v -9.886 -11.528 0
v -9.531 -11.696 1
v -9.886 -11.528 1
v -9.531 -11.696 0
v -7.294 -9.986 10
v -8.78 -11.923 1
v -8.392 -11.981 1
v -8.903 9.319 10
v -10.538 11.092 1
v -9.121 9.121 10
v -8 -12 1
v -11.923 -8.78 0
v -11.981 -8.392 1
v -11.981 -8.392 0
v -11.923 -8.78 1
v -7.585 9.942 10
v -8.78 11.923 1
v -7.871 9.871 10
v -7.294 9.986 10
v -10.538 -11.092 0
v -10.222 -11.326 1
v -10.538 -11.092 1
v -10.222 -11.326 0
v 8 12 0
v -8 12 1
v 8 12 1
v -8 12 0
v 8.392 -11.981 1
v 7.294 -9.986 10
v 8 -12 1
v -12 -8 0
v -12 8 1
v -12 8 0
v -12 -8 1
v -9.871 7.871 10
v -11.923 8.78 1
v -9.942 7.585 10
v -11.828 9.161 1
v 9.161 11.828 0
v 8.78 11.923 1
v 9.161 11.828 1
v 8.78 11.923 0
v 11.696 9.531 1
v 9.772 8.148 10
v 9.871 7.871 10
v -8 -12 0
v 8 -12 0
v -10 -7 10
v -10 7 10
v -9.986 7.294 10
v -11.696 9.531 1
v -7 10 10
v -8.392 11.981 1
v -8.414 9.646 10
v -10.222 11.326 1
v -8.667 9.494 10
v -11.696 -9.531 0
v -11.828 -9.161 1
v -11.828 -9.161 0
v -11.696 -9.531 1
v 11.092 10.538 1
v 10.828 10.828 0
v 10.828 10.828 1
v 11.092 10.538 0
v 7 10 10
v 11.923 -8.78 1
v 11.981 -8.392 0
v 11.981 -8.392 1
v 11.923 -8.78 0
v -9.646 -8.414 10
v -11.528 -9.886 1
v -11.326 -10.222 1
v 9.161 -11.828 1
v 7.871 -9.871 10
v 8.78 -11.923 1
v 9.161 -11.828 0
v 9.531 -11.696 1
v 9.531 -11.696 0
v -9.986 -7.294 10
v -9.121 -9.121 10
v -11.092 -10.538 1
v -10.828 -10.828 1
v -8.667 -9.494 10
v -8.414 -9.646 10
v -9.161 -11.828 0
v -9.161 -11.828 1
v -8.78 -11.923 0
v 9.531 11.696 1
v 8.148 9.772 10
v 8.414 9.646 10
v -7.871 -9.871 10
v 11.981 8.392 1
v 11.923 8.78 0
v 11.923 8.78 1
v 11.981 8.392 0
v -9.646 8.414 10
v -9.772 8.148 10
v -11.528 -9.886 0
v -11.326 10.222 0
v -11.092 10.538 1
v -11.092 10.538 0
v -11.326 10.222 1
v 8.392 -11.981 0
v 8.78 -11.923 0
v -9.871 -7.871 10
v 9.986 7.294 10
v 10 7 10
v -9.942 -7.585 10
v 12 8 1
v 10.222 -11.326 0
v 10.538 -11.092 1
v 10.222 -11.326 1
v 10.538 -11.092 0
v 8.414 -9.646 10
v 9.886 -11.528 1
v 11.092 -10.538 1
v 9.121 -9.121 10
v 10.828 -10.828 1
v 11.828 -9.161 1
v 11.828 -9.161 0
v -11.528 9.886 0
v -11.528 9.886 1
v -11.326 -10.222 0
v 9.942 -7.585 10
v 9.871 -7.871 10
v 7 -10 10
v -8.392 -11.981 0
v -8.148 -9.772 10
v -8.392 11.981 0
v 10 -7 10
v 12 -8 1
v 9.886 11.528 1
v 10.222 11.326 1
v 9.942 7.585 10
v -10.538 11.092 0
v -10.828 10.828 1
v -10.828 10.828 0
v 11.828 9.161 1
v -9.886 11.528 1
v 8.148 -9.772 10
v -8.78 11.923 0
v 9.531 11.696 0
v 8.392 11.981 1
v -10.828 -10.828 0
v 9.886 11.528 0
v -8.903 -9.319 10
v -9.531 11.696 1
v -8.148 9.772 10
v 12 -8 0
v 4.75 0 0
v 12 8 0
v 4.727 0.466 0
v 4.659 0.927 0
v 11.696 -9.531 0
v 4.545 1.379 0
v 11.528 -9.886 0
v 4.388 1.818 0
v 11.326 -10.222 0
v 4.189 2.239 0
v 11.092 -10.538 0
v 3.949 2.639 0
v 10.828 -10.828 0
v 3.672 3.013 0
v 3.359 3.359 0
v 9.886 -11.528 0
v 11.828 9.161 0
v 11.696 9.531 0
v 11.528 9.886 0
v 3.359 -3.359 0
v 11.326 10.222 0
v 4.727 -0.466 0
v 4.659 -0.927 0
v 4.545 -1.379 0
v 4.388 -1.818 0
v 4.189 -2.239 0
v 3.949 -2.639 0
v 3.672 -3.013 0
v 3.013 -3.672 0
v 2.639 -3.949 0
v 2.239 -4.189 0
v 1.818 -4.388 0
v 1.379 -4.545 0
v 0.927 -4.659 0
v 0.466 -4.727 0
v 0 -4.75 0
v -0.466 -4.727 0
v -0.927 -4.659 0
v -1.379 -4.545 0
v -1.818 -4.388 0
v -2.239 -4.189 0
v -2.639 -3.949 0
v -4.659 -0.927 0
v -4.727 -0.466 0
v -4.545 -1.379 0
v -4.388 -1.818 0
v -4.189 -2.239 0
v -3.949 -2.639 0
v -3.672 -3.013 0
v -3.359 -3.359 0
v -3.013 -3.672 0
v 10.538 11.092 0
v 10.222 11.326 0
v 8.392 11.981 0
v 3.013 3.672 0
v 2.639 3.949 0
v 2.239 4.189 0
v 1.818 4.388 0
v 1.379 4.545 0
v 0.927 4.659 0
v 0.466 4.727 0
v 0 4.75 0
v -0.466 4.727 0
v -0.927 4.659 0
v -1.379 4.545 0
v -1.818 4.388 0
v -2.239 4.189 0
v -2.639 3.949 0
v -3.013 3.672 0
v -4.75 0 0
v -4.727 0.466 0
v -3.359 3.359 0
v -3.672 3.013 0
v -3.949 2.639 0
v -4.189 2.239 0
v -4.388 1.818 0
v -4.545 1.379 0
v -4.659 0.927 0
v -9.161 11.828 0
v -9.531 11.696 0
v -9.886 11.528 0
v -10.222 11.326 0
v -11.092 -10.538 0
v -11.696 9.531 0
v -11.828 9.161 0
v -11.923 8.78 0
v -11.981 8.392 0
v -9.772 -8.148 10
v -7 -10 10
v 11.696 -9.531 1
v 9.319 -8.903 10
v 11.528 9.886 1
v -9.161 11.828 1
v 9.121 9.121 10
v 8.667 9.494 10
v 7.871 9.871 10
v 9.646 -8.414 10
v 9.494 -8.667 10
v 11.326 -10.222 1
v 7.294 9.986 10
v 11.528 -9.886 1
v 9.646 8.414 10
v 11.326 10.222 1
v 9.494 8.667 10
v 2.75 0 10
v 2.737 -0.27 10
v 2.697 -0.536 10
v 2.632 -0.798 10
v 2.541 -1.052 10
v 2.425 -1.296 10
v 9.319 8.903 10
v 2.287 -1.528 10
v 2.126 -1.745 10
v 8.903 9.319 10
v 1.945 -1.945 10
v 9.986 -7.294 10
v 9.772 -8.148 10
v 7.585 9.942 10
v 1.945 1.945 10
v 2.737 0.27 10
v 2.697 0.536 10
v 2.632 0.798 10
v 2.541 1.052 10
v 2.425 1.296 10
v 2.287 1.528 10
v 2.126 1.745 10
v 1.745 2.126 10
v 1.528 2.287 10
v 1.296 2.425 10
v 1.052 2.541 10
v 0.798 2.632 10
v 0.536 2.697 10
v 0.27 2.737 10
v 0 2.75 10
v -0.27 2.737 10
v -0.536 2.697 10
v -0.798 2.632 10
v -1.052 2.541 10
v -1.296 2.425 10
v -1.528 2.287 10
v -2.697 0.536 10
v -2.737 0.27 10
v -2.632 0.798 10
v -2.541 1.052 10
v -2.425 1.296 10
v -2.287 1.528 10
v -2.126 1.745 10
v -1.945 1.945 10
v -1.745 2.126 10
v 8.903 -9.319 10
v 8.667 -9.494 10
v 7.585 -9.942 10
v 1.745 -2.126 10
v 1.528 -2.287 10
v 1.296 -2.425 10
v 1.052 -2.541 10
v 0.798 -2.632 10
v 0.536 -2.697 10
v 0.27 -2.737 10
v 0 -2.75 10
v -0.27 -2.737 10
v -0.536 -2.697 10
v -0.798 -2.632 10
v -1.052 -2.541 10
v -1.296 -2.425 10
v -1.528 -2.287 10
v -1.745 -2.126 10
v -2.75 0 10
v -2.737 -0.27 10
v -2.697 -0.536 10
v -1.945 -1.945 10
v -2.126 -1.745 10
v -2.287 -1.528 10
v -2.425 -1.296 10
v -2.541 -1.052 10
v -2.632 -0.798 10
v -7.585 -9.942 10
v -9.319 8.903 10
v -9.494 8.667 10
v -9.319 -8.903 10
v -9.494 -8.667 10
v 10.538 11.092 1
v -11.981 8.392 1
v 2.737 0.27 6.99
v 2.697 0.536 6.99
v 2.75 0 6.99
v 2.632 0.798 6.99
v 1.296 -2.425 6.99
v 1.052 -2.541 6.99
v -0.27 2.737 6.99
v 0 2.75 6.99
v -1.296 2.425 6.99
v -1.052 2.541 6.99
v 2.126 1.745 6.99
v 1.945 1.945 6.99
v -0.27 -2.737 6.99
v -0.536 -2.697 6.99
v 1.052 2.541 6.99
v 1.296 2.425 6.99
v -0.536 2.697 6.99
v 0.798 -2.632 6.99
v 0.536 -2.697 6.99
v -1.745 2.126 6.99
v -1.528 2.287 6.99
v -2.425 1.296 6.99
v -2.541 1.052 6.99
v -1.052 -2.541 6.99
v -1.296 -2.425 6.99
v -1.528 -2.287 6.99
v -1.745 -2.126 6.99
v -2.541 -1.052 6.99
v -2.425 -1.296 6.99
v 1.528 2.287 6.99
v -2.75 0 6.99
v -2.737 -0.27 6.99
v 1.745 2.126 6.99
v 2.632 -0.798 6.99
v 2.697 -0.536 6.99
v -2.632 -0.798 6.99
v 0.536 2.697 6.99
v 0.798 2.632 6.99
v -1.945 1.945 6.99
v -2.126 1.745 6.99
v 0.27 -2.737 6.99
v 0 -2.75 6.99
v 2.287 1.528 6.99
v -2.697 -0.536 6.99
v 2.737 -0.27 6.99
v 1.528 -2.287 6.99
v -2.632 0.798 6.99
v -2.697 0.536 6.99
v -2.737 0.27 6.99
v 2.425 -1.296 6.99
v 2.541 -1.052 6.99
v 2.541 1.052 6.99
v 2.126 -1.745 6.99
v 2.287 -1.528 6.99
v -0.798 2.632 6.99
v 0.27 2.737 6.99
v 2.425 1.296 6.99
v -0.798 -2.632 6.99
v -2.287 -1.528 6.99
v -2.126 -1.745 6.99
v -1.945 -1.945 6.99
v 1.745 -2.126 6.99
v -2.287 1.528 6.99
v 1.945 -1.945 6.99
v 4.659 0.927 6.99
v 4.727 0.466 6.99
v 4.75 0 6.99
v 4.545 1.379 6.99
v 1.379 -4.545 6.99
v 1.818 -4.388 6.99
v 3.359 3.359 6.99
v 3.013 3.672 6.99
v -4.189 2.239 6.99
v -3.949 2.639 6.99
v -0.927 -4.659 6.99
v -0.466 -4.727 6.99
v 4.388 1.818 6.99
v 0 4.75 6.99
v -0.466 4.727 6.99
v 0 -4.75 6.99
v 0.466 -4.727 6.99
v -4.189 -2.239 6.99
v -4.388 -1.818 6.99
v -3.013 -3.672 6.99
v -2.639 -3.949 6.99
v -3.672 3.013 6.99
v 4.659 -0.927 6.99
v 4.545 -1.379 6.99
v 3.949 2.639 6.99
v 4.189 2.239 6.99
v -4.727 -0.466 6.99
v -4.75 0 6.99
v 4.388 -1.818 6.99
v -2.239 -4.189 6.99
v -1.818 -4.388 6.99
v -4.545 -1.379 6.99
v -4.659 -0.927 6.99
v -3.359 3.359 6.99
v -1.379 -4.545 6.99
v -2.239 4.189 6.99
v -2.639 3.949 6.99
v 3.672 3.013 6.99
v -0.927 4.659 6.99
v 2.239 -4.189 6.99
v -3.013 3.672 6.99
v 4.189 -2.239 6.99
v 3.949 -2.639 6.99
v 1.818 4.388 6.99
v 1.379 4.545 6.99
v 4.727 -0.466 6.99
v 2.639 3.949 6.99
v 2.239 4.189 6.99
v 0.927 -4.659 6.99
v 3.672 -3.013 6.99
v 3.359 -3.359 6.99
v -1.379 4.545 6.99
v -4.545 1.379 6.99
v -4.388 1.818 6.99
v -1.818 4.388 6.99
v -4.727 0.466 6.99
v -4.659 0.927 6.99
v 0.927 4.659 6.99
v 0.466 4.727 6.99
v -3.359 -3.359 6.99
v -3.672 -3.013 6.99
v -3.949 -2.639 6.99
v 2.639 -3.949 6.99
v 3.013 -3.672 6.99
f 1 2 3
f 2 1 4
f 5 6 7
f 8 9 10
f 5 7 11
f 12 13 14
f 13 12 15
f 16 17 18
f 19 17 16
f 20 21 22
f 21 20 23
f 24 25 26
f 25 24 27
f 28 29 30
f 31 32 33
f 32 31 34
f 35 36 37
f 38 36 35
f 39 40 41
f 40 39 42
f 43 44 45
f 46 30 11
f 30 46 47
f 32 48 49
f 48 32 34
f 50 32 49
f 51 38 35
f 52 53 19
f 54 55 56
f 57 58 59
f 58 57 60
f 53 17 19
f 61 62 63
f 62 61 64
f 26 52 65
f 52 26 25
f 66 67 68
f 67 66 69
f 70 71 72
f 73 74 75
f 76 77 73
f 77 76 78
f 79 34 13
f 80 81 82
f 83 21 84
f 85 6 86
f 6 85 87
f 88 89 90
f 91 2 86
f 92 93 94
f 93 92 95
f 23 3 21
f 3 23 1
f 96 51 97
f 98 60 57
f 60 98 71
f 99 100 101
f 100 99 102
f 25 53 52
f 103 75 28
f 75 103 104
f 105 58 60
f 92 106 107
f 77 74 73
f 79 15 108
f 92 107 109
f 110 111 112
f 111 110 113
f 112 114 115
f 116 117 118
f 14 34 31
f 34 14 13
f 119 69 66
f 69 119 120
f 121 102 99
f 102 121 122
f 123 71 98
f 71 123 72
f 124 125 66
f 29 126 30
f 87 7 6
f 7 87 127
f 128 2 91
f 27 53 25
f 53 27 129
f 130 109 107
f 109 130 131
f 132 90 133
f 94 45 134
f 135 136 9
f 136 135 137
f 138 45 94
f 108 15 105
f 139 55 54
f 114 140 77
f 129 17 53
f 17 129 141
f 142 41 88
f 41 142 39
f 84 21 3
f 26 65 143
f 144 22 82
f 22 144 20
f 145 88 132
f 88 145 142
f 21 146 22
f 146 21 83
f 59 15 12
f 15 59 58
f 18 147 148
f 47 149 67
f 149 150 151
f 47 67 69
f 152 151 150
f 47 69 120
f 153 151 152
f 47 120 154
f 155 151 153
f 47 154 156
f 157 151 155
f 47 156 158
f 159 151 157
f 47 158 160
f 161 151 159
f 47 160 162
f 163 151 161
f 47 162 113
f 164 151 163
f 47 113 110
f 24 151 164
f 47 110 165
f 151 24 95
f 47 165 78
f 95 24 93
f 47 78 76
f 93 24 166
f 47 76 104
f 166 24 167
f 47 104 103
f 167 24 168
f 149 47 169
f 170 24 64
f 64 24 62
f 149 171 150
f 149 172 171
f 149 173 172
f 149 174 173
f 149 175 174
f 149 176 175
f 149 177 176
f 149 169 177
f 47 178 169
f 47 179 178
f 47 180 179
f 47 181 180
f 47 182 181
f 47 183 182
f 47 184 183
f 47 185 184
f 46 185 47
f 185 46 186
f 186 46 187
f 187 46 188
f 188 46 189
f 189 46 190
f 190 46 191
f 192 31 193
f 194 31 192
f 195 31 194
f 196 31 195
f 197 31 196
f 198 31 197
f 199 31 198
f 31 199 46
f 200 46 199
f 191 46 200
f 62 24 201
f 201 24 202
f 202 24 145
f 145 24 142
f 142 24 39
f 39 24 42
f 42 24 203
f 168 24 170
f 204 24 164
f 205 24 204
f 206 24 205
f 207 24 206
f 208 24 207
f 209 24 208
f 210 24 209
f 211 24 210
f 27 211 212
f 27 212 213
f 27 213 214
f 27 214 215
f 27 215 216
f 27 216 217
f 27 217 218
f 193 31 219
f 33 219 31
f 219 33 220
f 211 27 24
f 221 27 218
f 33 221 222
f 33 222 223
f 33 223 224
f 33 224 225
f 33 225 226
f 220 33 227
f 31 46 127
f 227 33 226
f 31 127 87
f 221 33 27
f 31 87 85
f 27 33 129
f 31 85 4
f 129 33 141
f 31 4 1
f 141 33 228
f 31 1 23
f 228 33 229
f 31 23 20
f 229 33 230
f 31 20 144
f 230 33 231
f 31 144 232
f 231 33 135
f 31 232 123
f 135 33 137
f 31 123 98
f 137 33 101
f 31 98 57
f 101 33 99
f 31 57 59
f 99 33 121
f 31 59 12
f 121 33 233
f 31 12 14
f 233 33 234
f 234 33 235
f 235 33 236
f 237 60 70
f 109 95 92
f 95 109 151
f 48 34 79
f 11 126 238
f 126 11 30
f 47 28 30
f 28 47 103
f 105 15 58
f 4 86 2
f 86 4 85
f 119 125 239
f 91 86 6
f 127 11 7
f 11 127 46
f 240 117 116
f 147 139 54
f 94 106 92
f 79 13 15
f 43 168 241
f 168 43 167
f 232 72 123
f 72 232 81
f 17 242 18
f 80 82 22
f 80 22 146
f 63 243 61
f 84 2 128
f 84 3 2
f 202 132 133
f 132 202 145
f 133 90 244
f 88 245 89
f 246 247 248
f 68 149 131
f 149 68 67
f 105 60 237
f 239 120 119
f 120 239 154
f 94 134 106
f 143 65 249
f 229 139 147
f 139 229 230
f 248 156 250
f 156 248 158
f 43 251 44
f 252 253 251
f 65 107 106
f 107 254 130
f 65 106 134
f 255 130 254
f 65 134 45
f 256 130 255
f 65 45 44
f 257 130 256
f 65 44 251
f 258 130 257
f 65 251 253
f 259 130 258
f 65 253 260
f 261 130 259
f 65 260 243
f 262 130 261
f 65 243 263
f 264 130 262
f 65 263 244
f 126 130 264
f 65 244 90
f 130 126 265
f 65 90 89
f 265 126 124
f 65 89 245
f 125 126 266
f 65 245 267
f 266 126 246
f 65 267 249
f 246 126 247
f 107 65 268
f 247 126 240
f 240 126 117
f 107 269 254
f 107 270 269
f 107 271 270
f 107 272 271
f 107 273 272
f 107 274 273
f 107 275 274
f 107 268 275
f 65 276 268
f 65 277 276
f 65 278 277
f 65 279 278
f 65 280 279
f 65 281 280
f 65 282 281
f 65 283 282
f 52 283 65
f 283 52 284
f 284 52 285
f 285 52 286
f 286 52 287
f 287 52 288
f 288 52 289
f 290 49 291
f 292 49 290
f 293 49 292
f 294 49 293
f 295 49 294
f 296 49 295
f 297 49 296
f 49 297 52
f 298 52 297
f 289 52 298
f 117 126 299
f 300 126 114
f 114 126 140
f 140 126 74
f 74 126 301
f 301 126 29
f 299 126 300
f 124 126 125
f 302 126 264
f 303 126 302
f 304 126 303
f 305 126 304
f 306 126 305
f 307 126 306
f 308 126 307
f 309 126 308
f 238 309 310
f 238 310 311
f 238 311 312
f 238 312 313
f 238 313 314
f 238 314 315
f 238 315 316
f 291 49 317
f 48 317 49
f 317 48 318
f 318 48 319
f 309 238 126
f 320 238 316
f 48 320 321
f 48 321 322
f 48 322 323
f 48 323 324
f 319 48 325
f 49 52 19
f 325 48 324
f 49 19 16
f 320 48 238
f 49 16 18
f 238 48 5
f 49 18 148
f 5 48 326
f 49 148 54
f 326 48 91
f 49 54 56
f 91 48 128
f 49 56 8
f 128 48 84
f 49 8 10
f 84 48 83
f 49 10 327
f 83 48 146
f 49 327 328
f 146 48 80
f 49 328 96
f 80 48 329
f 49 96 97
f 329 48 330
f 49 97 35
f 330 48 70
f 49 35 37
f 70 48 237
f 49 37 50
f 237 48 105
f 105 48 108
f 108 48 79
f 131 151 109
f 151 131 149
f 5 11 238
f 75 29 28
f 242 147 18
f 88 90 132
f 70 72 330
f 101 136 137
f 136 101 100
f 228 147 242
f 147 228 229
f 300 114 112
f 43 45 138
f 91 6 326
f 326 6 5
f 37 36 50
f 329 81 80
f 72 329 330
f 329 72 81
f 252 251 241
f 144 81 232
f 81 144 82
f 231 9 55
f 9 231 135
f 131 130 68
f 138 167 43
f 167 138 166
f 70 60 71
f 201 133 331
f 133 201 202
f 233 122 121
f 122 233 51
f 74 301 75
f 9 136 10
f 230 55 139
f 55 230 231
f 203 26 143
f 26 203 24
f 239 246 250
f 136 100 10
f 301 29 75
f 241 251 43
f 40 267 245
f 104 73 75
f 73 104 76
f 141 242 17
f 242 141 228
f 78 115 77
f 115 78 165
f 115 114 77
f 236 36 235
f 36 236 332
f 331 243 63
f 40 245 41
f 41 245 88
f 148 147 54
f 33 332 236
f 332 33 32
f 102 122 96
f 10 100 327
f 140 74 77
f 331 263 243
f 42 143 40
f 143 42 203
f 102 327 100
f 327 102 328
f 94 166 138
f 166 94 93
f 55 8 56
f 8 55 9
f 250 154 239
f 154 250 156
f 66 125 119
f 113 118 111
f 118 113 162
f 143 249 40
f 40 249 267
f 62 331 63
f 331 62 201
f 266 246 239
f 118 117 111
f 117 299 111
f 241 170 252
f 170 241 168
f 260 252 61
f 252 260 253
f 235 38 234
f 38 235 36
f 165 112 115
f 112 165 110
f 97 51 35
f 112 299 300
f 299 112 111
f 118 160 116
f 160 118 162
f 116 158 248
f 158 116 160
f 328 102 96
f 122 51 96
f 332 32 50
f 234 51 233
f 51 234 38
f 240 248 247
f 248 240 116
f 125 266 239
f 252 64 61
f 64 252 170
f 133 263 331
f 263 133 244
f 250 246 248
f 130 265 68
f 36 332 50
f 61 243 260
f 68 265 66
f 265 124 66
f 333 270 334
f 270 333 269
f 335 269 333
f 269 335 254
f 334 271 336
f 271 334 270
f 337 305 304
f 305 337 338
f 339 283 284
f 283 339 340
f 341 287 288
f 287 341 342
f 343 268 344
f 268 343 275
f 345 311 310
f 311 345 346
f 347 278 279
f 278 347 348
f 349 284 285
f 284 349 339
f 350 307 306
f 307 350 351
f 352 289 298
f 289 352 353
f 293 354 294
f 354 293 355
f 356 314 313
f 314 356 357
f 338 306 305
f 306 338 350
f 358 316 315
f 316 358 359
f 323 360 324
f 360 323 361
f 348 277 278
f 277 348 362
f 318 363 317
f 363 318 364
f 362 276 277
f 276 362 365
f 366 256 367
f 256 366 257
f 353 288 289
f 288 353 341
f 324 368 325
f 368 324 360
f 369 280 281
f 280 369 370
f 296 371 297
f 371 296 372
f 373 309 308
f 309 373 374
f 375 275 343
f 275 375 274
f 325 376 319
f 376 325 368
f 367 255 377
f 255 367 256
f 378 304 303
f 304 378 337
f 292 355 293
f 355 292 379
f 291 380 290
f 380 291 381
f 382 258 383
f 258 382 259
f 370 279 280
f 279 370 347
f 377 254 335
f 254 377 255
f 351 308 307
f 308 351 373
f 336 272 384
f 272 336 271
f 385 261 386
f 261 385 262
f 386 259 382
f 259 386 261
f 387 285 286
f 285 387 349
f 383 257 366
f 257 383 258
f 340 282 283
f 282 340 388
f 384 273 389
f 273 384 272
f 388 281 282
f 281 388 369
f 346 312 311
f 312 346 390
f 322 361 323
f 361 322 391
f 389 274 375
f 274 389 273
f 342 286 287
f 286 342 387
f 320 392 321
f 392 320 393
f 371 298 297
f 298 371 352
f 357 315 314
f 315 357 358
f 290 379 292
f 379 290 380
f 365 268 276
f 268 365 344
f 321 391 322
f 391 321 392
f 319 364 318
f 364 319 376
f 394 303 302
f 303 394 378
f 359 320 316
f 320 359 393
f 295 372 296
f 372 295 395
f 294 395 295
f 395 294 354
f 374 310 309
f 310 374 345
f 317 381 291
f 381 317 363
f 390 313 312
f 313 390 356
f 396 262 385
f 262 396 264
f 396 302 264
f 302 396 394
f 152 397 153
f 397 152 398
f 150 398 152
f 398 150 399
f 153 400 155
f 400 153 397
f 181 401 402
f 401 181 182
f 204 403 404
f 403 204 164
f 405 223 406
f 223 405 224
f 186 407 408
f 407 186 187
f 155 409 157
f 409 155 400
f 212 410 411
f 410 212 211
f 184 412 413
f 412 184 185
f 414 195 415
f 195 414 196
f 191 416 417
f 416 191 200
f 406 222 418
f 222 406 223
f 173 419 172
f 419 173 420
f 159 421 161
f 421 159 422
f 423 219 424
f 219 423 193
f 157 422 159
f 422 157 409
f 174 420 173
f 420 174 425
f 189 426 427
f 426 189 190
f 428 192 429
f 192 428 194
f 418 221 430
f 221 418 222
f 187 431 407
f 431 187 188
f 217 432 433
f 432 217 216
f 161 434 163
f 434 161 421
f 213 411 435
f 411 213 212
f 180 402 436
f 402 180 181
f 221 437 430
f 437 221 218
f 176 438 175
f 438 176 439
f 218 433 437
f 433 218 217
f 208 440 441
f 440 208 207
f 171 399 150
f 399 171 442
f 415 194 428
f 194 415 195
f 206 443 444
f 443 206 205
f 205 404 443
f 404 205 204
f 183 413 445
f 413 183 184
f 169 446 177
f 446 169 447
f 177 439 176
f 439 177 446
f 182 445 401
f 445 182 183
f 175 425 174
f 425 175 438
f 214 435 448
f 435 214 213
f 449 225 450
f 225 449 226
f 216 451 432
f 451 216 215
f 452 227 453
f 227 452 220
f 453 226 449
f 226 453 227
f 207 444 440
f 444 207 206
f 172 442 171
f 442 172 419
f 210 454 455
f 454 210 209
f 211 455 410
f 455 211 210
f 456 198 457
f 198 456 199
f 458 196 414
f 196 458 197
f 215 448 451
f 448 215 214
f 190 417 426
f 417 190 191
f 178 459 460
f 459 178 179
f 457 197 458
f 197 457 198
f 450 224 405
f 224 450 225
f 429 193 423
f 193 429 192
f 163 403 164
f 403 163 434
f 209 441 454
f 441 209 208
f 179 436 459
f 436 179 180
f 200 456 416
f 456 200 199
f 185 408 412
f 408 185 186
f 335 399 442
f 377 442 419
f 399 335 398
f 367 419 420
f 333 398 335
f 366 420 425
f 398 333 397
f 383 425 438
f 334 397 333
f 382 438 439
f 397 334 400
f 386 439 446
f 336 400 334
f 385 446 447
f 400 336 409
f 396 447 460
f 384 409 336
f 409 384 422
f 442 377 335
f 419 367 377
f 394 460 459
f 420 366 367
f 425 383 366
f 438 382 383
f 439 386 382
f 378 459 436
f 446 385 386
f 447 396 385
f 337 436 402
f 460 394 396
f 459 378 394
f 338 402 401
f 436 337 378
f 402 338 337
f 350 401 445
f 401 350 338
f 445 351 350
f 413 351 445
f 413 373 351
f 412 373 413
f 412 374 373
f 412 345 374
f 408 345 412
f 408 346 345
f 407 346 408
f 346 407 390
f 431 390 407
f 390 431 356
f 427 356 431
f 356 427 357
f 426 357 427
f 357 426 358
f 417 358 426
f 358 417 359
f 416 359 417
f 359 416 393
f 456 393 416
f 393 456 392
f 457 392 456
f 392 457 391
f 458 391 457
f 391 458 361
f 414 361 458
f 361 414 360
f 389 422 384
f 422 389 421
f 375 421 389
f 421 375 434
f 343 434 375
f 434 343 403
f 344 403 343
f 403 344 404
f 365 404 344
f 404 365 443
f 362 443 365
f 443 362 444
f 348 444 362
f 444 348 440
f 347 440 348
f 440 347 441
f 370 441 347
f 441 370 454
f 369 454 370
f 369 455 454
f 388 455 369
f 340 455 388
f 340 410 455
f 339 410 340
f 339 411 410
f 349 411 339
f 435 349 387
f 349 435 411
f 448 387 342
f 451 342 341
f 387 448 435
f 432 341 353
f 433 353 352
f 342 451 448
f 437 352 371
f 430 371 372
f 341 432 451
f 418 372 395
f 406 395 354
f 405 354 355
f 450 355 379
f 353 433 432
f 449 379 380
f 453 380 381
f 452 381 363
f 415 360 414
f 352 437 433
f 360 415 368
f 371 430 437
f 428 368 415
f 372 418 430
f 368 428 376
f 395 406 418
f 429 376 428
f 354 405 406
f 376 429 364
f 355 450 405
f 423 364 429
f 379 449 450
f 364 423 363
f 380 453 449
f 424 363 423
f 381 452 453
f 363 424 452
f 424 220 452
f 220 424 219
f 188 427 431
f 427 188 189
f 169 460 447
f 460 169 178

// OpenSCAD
// file: ../generated/config.scad
// GENERATED by tools/build.py from config/rack.yaml — do not edit.

FRAME_PROFILE = 20;
FRAME_W = 700;
FRAME_D = 225;
FRAME_TILT = 20;
FRAME_ROW_Y0 = 25;
FRAME_BRACKET = 10;
FRAME_INNER_X0 = 30;
FRAME_BASE_H = 80;
FRAME_FOOT_H = 10;
FRAME_TOP_Z = 760;
ROW_IDS = ["A", "B", "C", "D"];
ROW_HEIGHTS = [165, 165, 165, 185];
ROW_LAYOUTS = [[1, 1, 1, 1], [1, 1, 1, 1], [1, 1, 1, 1], [2, 2]];
BAY_PITCH = 160;
BAY_GAP = 2;
CARRIER_W = 158;
CARRIER_D = 210;
CARRIER_BOTTOM = 2.5;
CARRIER_WALL = 2;
CARRIER_STANDOFF = 5;
CARRIER_DECK = 3;
CARRIER_FASCIA = 2.5;
CARRIER_WALL_H = 20.1;
CARRIER_PLENUM = 23.1;
PCB_TO_FLOOR = 14;
CAM_MOUNT = [100, 60, 30];
DRAWER_D = 196;
DRAWER_W = 142;
DRAWER_X0 = 8;
DRAWER_TRAVEL = 140;
DRAWER_GUIDE_W = 7.5;
DRAWER_CLEAR = 0.5;
DRAWER_BOTTOM = 2.5;
DRAWER_WALL = 2;
DRAWER_WALL_H = 16;
DRAWER_FRONT_H = 30;
DRAWER_FRONT_T = 4;
DRAWER_REAR_BAY = 30;
DRAWER_FLANGE = [3, 3];
DRAWER_MAGNET = [6, 3];
PLATE_T = 2.5;
CHAIN_INNER = [7, 7];
CHAIN_OUTER = [11, 10];
CHAIN_R = 18;
CHAIN_FIXED = [104, 90];
CHAIN_MOVING_X = 140;
CHAIN_FOOT_Y = 172;
CHAIN_BEND_Y = 182;
NODE_SIZE = [64, 80];
NODE_T = 1.6;
NODE_HOLES = [[3.5, 3.5], [60.5, 3.5], [3.5, 76.5], [60.5, 76.5]];
NODE_X0 = 4;
NODE_FRONT_Y = 3;
NODE_PCB_TOP = 9.1;
NODE_FRONT = [32, 12, 50];
NODE_VH_Y = 64;
NODE_RIGHT = [24, 40];
NODE_CAM = [64, 11];
HUB_SIZE = [120, 70];
HUB_HOLES = [[4, 4], [116, 4], [4, 66], [116, 66]];
// file: ../lib/common.scad
// Shared helpers for every printed part of hw-testing-rack.
include <../generated/config.scad>

$fn = $preview ? 32 : 64;
EPS = 0.01;

// Heat-set inserts (Ruthex-style).  Hole Ø is the recommended pre-hole.
INSERT_M3 = [4.0, 5.7];    // [hole Ø, depth]
INSERT_M2 = [3.2, 4.0];
INSERT_M25 = [3.6, 4.5];
M3_CLEAR = 3.4;
M5_CLEAR = 5.5;
M3_HEAD = [6.0, 3.0];      // DIN 912 / ISO 7380 head Ø × height (button head ~5.7)

module rbox(size, r = 2, center = false) {
    // Box with rounded vertical edges.
    translate(center ? [-size[0] / 2, -size[1] / 2, 0] : [0, 0, 0])
        hull() for (x = [r, size[0] - r], y = [r, size[1] - r])
            translate([x, y, 0]) cylinder(r = r, h = size[2]);
}

module rslot(len, w, h) {
    // Stadium-shaped slot along X, centred on the origin.
    hull() for (x = [-(len - w) / 2, (len - w) / 2]) translate([x, 0, 0]) cylinder(d = w, h = h);
}

module insert_hole(spec = INSERT_M3) {
    // Pocket for a heat-set insert, opening at z=0 and going -Z.
    translate([0, 0, -spec[1]]) cylinder(d = spec[0], h = spec[1] + EPS);
    translate([0, 0, -0.6]) cylinder(d1 = spec[0], d2 = spec[0] + 0.8, h = 0.6 + EPS);
}

module screw_through(d = M3_CLEAR, h = 20, head = M3_HEAD, counterbore = true) {
    // Clearance hole along +Z from z=0, with an optional counterbore at z=h.
    translate([0, 0, -EPS]) cylinder(d = d, h = h + 2 * EPS);
    if (counterbore) translate([0, 0, h - head[1]]) cylinder(d = head[0] + 0.4, h = head[1] + EPS);
}

module magnet_pocket(d = DRAWER_MAGNET[0], t = DRAWER_MAGNET[1]) {
    // Press-fit/glue pocket for a disc magnet, opening at z=0 going -Z.
    translate([0, 0, -t - 0.2]) cylinder(d = d + 0.25, h = t + 0.2 + EPS);
}

module label_text(txt, size = 6, depth = 0.6, font = "Liberation Sans:style=Bold") {
    linear_extrude(depth) text(txt, size = size, font = font, halign = "center", valign = "center");
}

// 2020 B-type profile, simplified (good enough for previews and clearance checks).
module extrusion2020(len) {
    s = FRAME_PROFILE;
    difference() {
        translate([-s / 2, -s / 2, 0]) cube([s, s, len]);
        for (a = [0, 90, 180, 270]) rotate([0, 0, a])
            translate([s / 2 - 1.8, -3, -EPS]) {
                cube([1.8 + EPS, 6, len + 2 * EPS]);
                translate([-4.2, -2.6, 0]) cube([4.3, 11.2, len + 2 * EPS]);
            }
        translate([0, 0, -EPS]) cylinder(d = 4.2, h = len + 2 * EPS);
    }
}
// file: ../lib/carrier.scad
// Geometry shared by the carrier, deck, drawer, plates, chain parts and the assembly.
// All positions are in CARRIER coordinates (origin = front-left-bottom of one
// bay's carrier, X right, Y towards the back, Z up) unless stated otherwise.
include <common.scad>

WALL = CARRIER_WALL;
BOSS_D = 7.5;

// ---------------------------------------------------------------- bay node PCB
// KiCad coordinates on the node (y = 0 at the REAR edge) → carrier XY.
function node_xy(k) = [NODE_X0 + k[0], NODE_FRONT_Y + (NODE_SIZE[1] - k[1])];
NODE_REAR_Y = NODE_FRONT_Y + NODE_SIZE[1];
VH_NOTCH_Y = node_xy([0, NODE_VH_Y])[1];

// ---------------------------------------------------------------- deck fixings
// Side screws go guide → deck → base wall boss (one screw holds all three).
GUIDE_SCREW_X = 2.8;
function side_screws() = [for (y = [30, 105, 185]) for (x = [GUIDE_SCREW_X, CARRIER_W - GUIDE_SCREW_X]) [x, y]];
// Free-standing pillars under the deck middle (clear of the node and the chain).
function deck_pillars() = [[40, 165], [82, 165], [125, 75]];

// ---------------------------------------------------------------- drawer & guides
DRAWER_Y0 = 0;                                     // closed drawer front face
DRAWER_INNER_W = DRAWER_W - 2 * DRAWER_WALL;
DRAWER_PORT_WALL_Y = DRAWER_D - DRAWER_REAR_BAY;   // inner wall carrying the USB-C ports (drawer coords)
GUIDE_Y0 = DRAWER_FRONT_T + 1;
GUIDE_LIP_Z = DRAWER_FLANGE[1] + 0.4;              // lip underside above the deck
GUIDE_LIP_T = 2.0;
GUIDE_WALL_T = DRAWER_X0 - DRAWER_FLANGE[0] - 0.5;  // solid wall of the C-channel (inner face 0.5 from the flange)
STOP_PIN_X = DRAWER_X0 - DRAWER_FLANGE[0] / 2 - 0.2; // M2.5 stop screw, in the flange path
FLANGE_Y = [DRAWER_D - 26, DRAWER_D - 6];          // rear flange segment (drawer coords)
STOP_Y = FLANGE_Y[0] - DRAWER_TRAVEL - 4.5;        // stop pin position (carrier coords)
DETENT_DRAWER = [22, DRAWER_D - 14];               // magnet in drawer bottom (drawer coords)
DETENT_DECK = [DRAWER_X0 + DETENT_DRAWER[0], DETENT_DRAWER[1]];

// panel-mount USB-C (DATA) and a slot for the optional AUX (JST-SH) pigtail, on the port wall
PORT_X = [DRAWER_W * 0.38, DRAWER_W * 0.62];       // [DATA, AUX]
PORT_Z = DRAWER_BOTTOM + 7;
PORT_EARS = 26;                                    // M3 ear pitch of common panel-mount USB-C extensions

// drawer width for a bay spanning `span` units (wide bays share the node of their left unit)
function drawer_w(span) = span * BAY_PITCH - BAY_GAP - 2 * DRAWER_GUIDE_W - 2 * DRAWER_CLEAR;

// board plate (drops into the drawer between front panel and port wall)
function plate_w(span) = drawer_w(span) - 2 * DRAWER_WALL - 0.6;
PLATE_W = DRAWER_INNER_W - 0.6;
PLATE_D = DRAWER_PORT_WALL_Y - DRAWER_FRONT_T - 0.6;
PLATE_X0 = DRAWER_WALL + 0.3;                      // drawer coords
PLATE_Y0 = DRAWER_FRONT_T + 0.3;
function plate_pins() = [[10, 10], [PLATE_W - 10, PLATE_D - 10]];   // 180°-symmetric locating pins

// ---------------------------------------------------------------- drag chain
CHAIN_W = CHAIN_OUTER[0];                          // vertical extent when lying flat
CHAIN_H = CHAIN_OUTER[1];                          // horizontal extent (X) of one run
CHAIN_Z = CARRIER_BOTTOM + CHAIN_W / 2 + 0.6;      // centre line height in the plenum
CHAIN_FIXED_RUN_X = CHAIN_FIXED[0];
DECK_SLOT = [CHAIN_MOVING_X, CHAIN_FOOT_Y - DRAWER_TRAVEL - 7, CHAIN_FOOT_Y + 7];  // x, y0, y1
FOOT_HOLE = [CHAIN_MOVING_X - DRAWER_X0, CHAIN_FOOT_Y];                           // drawer coords

// ---------------------------------------------------------------- camera pod
CAM_CENTER = [CAM_MOUNT[0], CAM_MOUNT[1]];
function cam_inserts() = [for (x = [-1, 1], y = [-1, 1]) CAM_CENTER + [x, y] * CAM_MOUNT[2] / 2];
CAM_CABLE_HOLE = node_xy(NODE_CAM) + [7, 0];          // camera 5 V lead goes down here
// main file
// Small frame accessories.
//
//   -D 'PART="foot"'       TPU foot under each corner post (M5 into the post's core)
//   -D 'PART="slot_clip"'  snap clip holding up to four 0.75 mm² wires in a 2020 slot
//   -D 'PART="label"'      12 × 100 mm label blank for the drawer front recess
include <../lib/carrier.scad>

PART = "foot";

module foot() {
    difference() {
        hull() {
            translate([-12, -12, 0]) rbox([24, 24, 1], r = 4);
            translate([-10, -10, FRAME_FOOT_H - 1]) rbox([20, 20, 1], r = 3);
        }
        translate([0, 0, -EPS]) cylinder(d = M5_CLEAR, h = FRAME_FOOT_H + 1);
        translate([0, 0, -EPS]) cylinder(d = 9.5, h = FRAME_FOOT_H - 3);
    }
}

module slot_clip() {
    // T-profile that snaps into the 6 mm slot; wires sit in the channel behind the cover
    difference() {
        union() {
            translate([-12, -5.8 / 2, 0]) cube([24, 5.8, 6]);          // body in the slot
            translate([-12, -10 / 2, 6]) cube([24, 10, 1.2]);           // cover flush with the profile face
            for (s = [-1, 1]) translate([-12, s * 2.9 - (s > 0 ? 0 : 1.2), 1]) cube([24, 1.2, 2]);   // barbs
        }
        translate([-12 - EPS, -3.8 / 2, -EPS]) cube([24 + 2 * EPS, 3.8, 5]);
    }
}

module label() {
    difference() {
        rbox([100, 12, 1.0], r = 1);
    }
}

if (PART == "foot") foot();
else if (PART == "slot_clip") slot_clip();
else label();
